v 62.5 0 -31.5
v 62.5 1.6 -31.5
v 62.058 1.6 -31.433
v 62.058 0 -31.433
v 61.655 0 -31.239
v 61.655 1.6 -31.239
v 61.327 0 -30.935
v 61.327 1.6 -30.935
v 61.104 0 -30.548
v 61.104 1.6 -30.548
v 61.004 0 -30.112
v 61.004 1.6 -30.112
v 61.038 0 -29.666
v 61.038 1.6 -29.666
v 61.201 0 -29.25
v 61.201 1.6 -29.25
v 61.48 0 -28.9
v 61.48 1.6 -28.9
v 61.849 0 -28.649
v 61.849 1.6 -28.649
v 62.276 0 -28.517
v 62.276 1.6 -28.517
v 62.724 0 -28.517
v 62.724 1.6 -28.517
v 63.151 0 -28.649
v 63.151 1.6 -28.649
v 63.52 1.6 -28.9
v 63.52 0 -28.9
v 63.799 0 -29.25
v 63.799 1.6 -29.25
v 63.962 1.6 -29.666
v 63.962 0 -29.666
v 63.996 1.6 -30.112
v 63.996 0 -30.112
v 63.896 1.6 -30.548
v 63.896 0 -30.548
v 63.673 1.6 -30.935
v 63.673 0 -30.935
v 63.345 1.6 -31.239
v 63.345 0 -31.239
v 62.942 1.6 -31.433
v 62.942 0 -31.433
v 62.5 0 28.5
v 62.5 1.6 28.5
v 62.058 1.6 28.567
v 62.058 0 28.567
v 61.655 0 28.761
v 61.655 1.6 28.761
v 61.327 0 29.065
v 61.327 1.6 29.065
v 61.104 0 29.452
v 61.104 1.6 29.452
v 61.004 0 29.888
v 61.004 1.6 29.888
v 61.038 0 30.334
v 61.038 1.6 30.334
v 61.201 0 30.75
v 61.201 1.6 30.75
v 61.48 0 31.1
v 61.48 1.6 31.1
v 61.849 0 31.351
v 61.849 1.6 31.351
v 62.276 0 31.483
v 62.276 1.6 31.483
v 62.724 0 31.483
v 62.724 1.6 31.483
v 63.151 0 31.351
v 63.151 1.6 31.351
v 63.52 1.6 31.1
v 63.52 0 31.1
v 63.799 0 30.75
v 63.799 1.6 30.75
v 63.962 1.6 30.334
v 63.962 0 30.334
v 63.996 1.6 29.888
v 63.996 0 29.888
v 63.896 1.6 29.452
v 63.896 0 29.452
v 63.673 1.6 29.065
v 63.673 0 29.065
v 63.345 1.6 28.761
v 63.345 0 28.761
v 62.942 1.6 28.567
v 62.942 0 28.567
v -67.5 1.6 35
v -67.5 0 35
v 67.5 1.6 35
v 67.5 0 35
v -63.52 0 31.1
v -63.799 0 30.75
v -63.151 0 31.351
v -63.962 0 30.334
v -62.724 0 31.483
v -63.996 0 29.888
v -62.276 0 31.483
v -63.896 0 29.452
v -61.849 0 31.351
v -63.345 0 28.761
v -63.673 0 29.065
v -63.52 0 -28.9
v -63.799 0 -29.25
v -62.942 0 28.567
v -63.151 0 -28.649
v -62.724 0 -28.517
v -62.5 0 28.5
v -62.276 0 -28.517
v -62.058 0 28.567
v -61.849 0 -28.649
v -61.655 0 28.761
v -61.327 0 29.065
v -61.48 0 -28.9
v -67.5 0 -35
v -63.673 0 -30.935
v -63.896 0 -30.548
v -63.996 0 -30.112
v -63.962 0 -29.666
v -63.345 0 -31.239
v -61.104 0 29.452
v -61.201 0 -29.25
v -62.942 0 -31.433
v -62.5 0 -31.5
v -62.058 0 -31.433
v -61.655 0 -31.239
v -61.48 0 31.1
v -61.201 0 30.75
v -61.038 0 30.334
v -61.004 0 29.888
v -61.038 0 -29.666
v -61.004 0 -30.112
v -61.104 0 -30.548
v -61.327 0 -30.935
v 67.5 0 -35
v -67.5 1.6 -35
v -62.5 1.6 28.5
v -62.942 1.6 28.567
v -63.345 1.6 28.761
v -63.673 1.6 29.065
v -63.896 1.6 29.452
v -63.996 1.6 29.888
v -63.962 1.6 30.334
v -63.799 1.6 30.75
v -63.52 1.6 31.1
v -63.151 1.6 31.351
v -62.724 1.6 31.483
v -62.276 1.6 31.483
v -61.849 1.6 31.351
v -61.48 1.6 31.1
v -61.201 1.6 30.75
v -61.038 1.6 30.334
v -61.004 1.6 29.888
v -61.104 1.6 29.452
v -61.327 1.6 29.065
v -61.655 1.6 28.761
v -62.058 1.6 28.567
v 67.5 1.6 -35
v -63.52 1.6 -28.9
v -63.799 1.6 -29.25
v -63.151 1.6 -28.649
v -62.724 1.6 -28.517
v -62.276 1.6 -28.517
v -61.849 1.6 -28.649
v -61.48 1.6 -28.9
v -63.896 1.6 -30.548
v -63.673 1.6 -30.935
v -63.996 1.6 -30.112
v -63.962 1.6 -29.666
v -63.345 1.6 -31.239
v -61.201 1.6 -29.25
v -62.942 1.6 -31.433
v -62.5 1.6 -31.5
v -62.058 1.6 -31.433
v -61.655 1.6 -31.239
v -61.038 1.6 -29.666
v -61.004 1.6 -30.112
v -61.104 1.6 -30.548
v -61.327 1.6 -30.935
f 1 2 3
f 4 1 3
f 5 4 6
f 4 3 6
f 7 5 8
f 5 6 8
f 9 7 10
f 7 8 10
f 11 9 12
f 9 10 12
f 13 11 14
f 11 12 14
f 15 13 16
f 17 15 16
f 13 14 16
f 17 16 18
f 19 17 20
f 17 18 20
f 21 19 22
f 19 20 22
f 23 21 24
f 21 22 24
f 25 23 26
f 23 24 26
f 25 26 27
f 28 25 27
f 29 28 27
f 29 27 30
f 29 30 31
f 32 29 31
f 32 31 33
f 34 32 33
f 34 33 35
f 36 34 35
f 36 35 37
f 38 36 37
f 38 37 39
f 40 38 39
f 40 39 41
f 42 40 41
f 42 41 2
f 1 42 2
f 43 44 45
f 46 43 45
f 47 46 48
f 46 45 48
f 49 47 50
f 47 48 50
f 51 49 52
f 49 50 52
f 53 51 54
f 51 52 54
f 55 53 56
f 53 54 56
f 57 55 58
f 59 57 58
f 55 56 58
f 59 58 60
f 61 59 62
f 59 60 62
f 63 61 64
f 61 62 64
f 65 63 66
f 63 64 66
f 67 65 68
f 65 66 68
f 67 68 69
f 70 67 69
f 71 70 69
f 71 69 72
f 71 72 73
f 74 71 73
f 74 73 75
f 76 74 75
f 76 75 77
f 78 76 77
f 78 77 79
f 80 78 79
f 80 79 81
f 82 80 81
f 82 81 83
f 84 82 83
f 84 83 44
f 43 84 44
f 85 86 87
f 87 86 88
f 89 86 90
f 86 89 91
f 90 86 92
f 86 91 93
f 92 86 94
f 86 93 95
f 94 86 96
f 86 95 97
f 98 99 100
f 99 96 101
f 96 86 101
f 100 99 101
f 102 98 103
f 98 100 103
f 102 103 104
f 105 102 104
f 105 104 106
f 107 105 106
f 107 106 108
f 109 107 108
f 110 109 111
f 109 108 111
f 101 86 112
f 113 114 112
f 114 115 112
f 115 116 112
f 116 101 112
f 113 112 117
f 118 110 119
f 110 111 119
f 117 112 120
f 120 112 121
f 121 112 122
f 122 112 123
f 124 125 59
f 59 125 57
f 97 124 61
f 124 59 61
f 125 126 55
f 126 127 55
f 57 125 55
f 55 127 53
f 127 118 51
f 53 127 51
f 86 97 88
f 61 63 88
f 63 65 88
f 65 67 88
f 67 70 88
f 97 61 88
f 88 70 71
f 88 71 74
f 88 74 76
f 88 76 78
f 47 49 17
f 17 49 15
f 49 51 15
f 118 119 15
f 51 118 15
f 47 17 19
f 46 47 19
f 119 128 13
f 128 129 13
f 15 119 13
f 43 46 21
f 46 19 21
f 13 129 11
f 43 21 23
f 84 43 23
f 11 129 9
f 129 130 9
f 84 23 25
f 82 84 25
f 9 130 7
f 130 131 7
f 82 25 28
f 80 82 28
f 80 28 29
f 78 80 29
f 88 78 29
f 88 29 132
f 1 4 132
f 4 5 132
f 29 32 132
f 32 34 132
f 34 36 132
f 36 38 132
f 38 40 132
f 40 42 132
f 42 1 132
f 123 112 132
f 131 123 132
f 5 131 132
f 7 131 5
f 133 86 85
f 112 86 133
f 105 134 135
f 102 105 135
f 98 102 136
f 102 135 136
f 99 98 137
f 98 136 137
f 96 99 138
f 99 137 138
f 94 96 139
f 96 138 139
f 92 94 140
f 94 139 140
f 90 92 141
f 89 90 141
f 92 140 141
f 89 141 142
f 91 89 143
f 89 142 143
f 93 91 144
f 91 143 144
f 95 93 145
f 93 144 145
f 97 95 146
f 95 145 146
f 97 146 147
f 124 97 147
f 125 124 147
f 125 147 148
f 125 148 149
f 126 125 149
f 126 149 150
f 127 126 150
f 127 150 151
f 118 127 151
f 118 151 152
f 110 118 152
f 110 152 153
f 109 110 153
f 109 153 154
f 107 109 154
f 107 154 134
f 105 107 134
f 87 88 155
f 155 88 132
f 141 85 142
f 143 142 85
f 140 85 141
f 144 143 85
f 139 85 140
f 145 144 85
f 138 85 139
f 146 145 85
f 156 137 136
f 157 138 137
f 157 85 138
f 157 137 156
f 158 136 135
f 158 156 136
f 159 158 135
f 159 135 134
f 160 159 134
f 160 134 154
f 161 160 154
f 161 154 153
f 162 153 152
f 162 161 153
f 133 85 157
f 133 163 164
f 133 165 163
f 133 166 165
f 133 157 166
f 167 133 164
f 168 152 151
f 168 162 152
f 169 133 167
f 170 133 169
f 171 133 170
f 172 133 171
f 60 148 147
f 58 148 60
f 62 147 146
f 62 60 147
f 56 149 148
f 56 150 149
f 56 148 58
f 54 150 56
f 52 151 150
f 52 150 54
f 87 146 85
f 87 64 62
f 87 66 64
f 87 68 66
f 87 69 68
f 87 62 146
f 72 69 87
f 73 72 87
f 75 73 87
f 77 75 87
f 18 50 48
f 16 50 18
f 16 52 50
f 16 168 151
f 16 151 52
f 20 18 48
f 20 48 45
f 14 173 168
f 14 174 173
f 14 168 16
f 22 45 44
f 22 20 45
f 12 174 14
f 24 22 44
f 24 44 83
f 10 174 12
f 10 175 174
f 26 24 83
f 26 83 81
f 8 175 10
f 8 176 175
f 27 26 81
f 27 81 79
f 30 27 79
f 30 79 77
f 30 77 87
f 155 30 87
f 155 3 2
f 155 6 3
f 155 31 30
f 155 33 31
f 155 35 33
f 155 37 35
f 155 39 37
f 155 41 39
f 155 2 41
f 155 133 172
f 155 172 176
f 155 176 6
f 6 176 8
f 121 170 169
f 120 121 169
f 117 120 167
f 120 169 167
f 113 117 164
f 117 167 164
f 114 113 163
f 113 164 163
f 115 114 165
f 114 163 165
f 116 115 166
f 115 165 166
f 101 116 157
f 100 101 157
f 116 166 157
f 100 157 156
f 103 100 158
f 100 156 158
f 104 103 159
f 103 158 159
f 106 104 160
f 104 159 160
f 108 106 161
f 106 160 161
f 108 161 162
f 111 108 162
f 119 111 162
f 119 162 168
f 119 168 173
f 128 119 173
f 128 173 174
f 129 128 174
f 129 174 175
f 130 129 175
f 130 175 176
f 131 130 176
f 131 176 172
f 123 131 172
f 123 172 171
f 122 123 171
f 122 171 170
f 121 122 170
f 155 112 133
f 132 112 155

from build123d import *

# Parameters (mm, degrees)
SKETCH1_W                      = 135
SKETCH1_H                      = 70
BOSS_EXTRUDE1_DEPTH            = 1.6
CUT_EXTRUDE1_REACH             = 78.051
SKETCH2_R                      = 1.5
CUT_EXTRUDE1_DIRECTION_2_DEPTH = 77.051364222


with BuildPart() as part:
    # Sketch1 → Boss-Extrude1 (new body)
    with BuildSketch(Plane(origin=(0, 0, 0), x_dir=(1, 0, 0), z_dir=(0, 1, 0))):
        Rectangle(SKETCH1_W, SKETCH1_H)
    extrude(amount=BOSS_EXTRUDE1_DEPTH)

    # Sketch2 → Cut-Extrude1 (cut, up to next)
    with BuildSketch(Plane(origin=(0, 1.6, 0), x_dir=(1, 0, 0), z_dir=(0, 1, 0)), mode=Mode.PRIVATE) as cut_extrude1_sk1:
        with Locations(Location((-62.5, 30, 0), (0, 0, 90))):
            Circle(SKETCH2_R)
    cut_extrude1_tool1 = extrude(cut_extrude1_sk1.sketch, amount=-CUT_EXTRUDE1_REACH, mode=Mode.PRIVATE) & part.part
    # Sketch2 → Cut-Extrude1 (cut, up to next)
    with BuildSketch(Plane(origin=(0, 1.6, 0), x_dir=(1, 0, 0), z_dir=(0, 1, 0)), mode=Mode.PRIVATE) as cut_extrude1_sk2:
        with Locations(Location((62.5, 30, 0), (0, 0, 90))):
            Circle(SKETCH2_R)
    cut_extrude1_tool2 = extrude(cut_extrude1_sk2.sketch, amount=-CUT_EXTRUDE1_REACH, mode=Mode.PRIVATE) & part.part
    # Sketch2 → Cut-Extrude1 (cut, up to next)
    with BuildSketch(Plane(origin=(0, 1.6, 0), x_dir=(1, 0, 0), z_dir=(0, 1, 0)), mode=Mode.PRIVATE) as cut_extrude1_sk3:
        with Locations(Location((62.5, -30, 0), (0, 0, 90))):
            Circle(SKETCH2_R)
    cut_extrude1_tool3 = extrude(cut_extrude1_sk3.sketch, amount=-CUT_EXTRUDE1_REACH, mode=Mode.PRIVATE) & part.part
    # Sketch2 → Cut-Extrude1 (cut, up to next)
    with BuildSketch(Plane(origin=(0, 1.6, 0), x_dir=(1, 0, 0), z_dir=(0, 1, 0)), mode=Mode.PRIVATE) as cut_extrude1_sk4:
        with Locations(Location((-62.5, -30, 0), (0, 0, 90))):
            Circle(SKETCH2_R)
    cut_extrude1_tool4 = extrude(cut_extrude1_sk4.sketch, amount=-CUT_EXTRUDE1_REACH, mode=Mode.PRIVATE) & part.part
    add(cut_extrude1_tool1.solids().sort_by_distance((-62.5, 1.6, -30))[0], mode=Mode.SUBTRACT)
    add(cut_extrude1_tool2.solids().sort_by_distance((62.5, 1.6, -30))[0], mode=Mode.SUBTRACT)
    add(cut_extrude1_tool3.solids().sort_by_distance((62.5, 1.6, 30))[0], mode=Mode.SUBTRACT)
    add(cut_extrude1_tool4.solids().sort_by_distance((-62.5, 1.6, 30))[0], mode=Mode.SUBTRACT)

    # Sketch2 → Cut-Extrude1 direction 2 (cut)
    with BuildSketch(Plane(origin=(0, 1.6, 0), x_dir=(1, 0, 0), z_dir=(0, 1, 0))):
        with Locations(Location((-62.5, 30, 0), (0, 0, 90))):
            Circle(SKETCH2_R)
        with Locations(Location((62.5, 30, 0), (0, 0, 90))):
            Circle(SKETCH2_R)
        with Locations(Location((62.5, -30, 0), (0, 0, 90))):
            Circle(SKETCH2_R)
        with Locations(Location((-62.5, -30, 0), (0, 0, 90))):
            Circle(SKETCH2_R)
    extrude(amount=CUT_EXTRUDE1_DIRECTION_2_DEPTH, mode=Mode.SUBTRACT)


solid = part.part
